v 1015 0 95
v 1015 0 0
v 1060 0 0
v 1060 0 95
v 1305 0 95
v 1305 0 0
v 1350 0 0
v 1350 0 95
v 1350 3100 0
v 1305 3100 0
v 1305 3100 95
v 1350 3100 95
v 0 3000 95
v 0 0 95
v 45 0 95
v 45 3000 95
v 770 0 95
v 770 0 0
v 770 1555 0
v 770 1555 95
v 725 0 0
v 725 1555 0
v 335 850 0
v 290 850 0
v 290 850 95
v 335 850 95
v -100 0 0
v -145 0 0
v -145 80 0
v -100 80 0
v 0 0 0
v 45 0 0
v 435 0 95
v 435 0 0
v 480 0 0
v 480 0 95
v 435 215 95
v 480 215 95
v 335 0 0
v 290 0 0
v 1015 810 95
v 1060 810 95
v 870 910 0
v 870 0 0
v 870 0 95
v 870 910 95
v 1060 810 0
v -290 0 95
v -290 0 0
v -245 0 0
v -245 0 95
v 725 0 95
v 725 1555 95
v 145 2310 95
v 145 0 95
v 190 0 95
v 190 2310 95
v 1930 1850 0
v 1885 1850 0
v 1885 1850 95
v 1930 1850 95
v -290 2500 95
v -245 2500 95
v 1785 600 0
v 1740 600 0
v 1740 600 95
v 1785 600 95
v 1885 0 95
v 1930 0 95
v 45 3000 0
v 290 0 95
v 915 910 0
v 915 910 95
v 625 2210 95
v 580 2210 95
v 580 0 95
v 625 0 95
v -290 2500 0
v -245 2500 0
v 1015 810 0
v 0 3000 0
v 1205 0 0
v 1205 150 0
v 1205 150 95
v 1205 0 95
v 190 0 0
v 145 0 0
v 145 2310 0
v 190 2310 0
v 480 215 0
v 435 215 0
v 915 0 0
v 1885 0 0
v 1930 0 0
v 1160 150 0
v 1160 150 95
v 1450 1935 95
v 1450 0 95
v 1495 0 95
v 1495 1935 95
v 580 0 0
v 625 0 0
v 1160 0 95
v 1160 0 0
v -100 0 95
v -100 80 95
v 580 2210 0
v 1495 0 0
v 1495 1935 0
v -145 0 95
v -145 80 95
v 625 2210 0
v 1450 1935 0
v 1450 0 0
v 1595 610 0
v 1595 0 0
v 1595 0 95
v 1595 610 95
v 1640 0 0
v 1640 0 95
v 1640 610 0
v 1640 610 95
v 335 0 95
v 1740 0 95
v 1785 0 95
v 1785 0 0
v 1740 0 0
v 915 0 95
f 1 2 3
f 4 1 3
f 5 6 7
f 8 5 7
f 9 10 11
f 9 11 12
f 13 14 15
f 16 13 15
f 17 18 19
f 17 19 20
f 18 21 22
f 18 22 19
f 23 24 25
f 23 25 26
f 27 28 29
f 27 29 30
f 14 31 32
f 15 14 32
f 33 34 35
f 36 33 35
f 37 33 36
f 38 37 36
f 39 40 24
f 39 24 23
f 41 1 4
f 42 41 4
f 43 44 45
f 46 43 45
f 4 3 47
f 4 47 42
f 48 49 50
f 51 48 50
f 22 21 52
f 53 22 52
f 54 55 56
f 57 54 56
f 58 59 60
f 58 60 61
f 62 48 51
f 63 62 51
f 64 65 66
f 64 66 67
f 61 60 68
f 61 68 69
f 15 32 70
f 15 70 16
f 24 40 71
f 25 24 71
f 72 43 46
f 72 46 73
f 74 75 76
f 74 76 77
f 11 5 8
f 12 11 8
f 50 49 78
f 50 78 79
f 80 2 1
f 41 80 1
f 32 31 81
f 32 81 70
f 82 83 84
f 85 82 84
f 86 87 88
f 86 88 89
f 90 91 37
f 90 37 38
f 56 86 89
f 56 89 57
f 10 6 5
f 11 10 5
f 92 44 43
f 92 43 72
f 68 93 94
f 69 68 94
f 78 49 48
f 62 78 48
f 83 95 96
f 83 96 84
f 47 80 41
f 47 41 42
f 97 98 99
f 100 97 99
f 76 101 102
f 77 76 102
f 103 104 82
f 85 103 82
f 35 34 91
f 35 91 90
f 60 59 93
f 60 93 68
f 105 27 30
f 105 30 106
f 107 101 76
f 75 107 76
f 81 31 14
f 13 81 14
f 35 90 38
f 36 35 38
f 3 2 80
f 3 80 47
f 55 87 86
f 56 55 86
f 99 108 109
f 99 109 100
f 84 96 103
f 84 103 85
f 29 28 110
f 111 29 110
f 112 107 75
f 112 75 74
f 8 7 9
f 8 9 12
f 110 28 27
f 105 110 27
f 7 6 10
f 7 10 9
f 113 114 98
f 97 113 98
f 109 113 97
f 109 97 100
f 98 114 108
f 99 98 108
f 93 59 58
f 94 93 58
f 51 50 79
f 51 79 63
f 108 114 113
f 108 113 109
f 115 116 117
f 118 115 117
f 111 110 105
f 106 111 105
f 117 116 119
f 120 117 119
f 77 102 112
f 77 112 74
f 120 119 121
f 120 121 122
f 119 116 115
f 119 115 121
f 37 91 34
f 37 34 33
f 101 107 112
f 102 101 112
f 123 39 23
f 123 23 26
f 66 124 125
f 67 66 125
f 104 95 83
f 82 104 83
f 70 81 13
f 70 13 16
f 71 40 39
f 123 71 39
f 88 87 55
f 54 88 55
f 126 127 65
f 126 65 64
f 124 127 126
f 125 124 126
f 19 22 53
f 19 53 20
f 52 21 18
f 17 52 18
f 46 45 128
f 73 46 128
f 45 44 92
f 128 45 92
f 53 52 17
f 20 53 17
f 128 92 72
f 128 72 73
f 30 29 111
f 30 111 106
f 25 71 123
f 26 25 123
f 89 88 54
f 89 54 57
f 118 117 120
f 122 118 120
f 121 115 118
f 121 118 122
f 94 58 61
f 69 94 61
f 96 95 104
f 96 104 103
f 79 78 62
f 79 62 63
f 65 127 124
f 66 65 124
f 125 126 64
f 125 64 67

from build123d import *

# Parameters (mm, degrees)
F0_W      = 45
F0_H      = 95
F1_DEPTH  = 3000
F2_DEPTH  = 2310
F3_DEPTH  = 850
F4_DEPTH  = 215
F5_DEPTH  = 2210
F6_DEPTH  = 1555
F7_DEPTH  = 910
F8_DEPTH  = 810
F9_DEPTH  = 150
F10_DEPTH = 3100
F11_DEPTH = 1935
F12_DEPTH = 610
F13_DEPTH = 600
F14_DEPTH = 1850
F15_DEPTH = 80
F16_DEPTH = 2500


with BuildPart() as f1:
    # F0 (on Front) → F1 (new body)
    with BuildSketch(Plane.XZ):
        with Locations((22.5, 47.5)):
            Rectangle(F0_W, F0_H)
    extrude(amount=-F1_DEPTH)


with BuildPart() as f2:
    # F0 (on Front) → F2 (new body)
    with BuildSketch(Plane.XZ):
        with Locations((167.5, 47.5)):
            Rectangle(F0_W, F0_H)
    extrude(amount=-F2_DEPTH)


with BuildPart() as f3:
    # F0 (on Front) → F3 (new body)
    with BuildSketch(Plane.XZ):
        with Locations((312.5, 47.5)):
            Rectangle(F0_W, F0_H)
    extrude(amount=-F3_DEPTH)


with BuildPart() as f4:
    # F0 (on Front) → F4 (new body)
    with BuildSketch(Plane.XZ):
        with Locations((457.5, 47.5)):
            Rectangle(F0_W, F0_H)
    extrude(amount=-F4_DEPTH)


with BuildPart() as f5:
    # F0 (on Front) → F5 (new body)
    with BuildSketch(Plane.XZ):
        with Locations((602.5, 47.5)):
            Rectangle(F0_W, F0_H)
    extrude(amount=-F5_DEPTH)


with BuildPart() as f6:
    # F0 (on Front) → F6 (new body)
    with BuildSketch(Plane.XZ):
        with Locations((747.5, 47.5)):
            Rectangle(F0_W, F0_H)
    extrude(amount=-F6_DEPTH)


with BuildPart() as f7:
    # F0 (on Front) → F7 (new body)
    with BuildSketch(Plane.XZ):
        with Locations((892.5, 47.5)):
            Rectangle(F0_W, F0_H)
    extrude(amount=-F7_DEPTH)


with BuildPart() as f8:
    # F0 (on Front) → F8 (new body)
    with BuildSketch(Plane.XZ):
        with Locations((1037.5, 47.5)):
            Rectangle(F0_W, F0_H)
    extrude(amount=-F8_DEPTH)


with BuildPart() as f9:
    # F0 (on Front) → F9 (new body)
    with BuildSketch(Plane.XZ):
        with Locations((1182.5, 47.5)):
            Rectangle(F0_W, F0_H)
    extrude(amount=-F9_DEPTH)


with BuildPart() as f10:
    # F0 (on Front) → F10 (new body)
    with BuildSketch(Plane.XZ):
        with Locations((1327.5, 47.5)):
            Rectangle(F0_W, F0_H)
    extrude(amount=-F10_DEPTH)


with BuildPart() as f11:
    # F0 (on Front) → F11 (new body)
    with BuildSketch(Plane.XZ):
        with Locations((1472.5, 47.5)):
            Rectangle(F0_W, F0_H)
    extrude(amount=-F11_DEPTH)


with BuildPart() as f12:
    # F0 (on Front) → F12 (new body)
    with BuildSketch(Plane.XZ):
        with Locations((1617.5, 47.5)):
            Rectangle(F0_W, F0_H)
    extrude(amount=-F12_DEPTH)


with BuildPart() as f13:
    # F0 (on Front) → F13 (new body)
    with BuildSketch(Plane.XZ):
        with Locations((1762.5, 47.5)):
            Rectangle(F0_W, F0_H)
    extrude(amount=-F13_DEPTH)


with BuildPart() as f14:
    # F0 (on Front) → F14 (new body)
    with BuildSketch(Plane.XZ):
        with Locations((1907.5, 47.5)):
            Rectangle(F0_W, F0_H)
    extrude(amount=-F14_DEPTH)


with BuildPart() as f15:
    # F0 (on Front) → F15 (new body)
    with BuildSketch(Plane.XZ):
        with Locations((-122.5, 47.5)):
            Rectangle(F0_W, F0_H)
    extrude(amount=-F15_DEPTH)


with BuildPart() as f16:
    # F0 (on Front) → F16 (new body)
    with BuildSketch(Plane.XZ):
        with Locations((-267.5, 47.5)):
            Rectangle(F0_W, F0_H)
    extrude(amount=-F16_DEPTH)


solid = Compound([f1.part, f2.part, f3.part, f4.part, f5.part, f6.part, f7.part, f8.part, f9.part, f10.part, f11.part, f12.part, f13.part, f14.part, f15.part, f16.part])
